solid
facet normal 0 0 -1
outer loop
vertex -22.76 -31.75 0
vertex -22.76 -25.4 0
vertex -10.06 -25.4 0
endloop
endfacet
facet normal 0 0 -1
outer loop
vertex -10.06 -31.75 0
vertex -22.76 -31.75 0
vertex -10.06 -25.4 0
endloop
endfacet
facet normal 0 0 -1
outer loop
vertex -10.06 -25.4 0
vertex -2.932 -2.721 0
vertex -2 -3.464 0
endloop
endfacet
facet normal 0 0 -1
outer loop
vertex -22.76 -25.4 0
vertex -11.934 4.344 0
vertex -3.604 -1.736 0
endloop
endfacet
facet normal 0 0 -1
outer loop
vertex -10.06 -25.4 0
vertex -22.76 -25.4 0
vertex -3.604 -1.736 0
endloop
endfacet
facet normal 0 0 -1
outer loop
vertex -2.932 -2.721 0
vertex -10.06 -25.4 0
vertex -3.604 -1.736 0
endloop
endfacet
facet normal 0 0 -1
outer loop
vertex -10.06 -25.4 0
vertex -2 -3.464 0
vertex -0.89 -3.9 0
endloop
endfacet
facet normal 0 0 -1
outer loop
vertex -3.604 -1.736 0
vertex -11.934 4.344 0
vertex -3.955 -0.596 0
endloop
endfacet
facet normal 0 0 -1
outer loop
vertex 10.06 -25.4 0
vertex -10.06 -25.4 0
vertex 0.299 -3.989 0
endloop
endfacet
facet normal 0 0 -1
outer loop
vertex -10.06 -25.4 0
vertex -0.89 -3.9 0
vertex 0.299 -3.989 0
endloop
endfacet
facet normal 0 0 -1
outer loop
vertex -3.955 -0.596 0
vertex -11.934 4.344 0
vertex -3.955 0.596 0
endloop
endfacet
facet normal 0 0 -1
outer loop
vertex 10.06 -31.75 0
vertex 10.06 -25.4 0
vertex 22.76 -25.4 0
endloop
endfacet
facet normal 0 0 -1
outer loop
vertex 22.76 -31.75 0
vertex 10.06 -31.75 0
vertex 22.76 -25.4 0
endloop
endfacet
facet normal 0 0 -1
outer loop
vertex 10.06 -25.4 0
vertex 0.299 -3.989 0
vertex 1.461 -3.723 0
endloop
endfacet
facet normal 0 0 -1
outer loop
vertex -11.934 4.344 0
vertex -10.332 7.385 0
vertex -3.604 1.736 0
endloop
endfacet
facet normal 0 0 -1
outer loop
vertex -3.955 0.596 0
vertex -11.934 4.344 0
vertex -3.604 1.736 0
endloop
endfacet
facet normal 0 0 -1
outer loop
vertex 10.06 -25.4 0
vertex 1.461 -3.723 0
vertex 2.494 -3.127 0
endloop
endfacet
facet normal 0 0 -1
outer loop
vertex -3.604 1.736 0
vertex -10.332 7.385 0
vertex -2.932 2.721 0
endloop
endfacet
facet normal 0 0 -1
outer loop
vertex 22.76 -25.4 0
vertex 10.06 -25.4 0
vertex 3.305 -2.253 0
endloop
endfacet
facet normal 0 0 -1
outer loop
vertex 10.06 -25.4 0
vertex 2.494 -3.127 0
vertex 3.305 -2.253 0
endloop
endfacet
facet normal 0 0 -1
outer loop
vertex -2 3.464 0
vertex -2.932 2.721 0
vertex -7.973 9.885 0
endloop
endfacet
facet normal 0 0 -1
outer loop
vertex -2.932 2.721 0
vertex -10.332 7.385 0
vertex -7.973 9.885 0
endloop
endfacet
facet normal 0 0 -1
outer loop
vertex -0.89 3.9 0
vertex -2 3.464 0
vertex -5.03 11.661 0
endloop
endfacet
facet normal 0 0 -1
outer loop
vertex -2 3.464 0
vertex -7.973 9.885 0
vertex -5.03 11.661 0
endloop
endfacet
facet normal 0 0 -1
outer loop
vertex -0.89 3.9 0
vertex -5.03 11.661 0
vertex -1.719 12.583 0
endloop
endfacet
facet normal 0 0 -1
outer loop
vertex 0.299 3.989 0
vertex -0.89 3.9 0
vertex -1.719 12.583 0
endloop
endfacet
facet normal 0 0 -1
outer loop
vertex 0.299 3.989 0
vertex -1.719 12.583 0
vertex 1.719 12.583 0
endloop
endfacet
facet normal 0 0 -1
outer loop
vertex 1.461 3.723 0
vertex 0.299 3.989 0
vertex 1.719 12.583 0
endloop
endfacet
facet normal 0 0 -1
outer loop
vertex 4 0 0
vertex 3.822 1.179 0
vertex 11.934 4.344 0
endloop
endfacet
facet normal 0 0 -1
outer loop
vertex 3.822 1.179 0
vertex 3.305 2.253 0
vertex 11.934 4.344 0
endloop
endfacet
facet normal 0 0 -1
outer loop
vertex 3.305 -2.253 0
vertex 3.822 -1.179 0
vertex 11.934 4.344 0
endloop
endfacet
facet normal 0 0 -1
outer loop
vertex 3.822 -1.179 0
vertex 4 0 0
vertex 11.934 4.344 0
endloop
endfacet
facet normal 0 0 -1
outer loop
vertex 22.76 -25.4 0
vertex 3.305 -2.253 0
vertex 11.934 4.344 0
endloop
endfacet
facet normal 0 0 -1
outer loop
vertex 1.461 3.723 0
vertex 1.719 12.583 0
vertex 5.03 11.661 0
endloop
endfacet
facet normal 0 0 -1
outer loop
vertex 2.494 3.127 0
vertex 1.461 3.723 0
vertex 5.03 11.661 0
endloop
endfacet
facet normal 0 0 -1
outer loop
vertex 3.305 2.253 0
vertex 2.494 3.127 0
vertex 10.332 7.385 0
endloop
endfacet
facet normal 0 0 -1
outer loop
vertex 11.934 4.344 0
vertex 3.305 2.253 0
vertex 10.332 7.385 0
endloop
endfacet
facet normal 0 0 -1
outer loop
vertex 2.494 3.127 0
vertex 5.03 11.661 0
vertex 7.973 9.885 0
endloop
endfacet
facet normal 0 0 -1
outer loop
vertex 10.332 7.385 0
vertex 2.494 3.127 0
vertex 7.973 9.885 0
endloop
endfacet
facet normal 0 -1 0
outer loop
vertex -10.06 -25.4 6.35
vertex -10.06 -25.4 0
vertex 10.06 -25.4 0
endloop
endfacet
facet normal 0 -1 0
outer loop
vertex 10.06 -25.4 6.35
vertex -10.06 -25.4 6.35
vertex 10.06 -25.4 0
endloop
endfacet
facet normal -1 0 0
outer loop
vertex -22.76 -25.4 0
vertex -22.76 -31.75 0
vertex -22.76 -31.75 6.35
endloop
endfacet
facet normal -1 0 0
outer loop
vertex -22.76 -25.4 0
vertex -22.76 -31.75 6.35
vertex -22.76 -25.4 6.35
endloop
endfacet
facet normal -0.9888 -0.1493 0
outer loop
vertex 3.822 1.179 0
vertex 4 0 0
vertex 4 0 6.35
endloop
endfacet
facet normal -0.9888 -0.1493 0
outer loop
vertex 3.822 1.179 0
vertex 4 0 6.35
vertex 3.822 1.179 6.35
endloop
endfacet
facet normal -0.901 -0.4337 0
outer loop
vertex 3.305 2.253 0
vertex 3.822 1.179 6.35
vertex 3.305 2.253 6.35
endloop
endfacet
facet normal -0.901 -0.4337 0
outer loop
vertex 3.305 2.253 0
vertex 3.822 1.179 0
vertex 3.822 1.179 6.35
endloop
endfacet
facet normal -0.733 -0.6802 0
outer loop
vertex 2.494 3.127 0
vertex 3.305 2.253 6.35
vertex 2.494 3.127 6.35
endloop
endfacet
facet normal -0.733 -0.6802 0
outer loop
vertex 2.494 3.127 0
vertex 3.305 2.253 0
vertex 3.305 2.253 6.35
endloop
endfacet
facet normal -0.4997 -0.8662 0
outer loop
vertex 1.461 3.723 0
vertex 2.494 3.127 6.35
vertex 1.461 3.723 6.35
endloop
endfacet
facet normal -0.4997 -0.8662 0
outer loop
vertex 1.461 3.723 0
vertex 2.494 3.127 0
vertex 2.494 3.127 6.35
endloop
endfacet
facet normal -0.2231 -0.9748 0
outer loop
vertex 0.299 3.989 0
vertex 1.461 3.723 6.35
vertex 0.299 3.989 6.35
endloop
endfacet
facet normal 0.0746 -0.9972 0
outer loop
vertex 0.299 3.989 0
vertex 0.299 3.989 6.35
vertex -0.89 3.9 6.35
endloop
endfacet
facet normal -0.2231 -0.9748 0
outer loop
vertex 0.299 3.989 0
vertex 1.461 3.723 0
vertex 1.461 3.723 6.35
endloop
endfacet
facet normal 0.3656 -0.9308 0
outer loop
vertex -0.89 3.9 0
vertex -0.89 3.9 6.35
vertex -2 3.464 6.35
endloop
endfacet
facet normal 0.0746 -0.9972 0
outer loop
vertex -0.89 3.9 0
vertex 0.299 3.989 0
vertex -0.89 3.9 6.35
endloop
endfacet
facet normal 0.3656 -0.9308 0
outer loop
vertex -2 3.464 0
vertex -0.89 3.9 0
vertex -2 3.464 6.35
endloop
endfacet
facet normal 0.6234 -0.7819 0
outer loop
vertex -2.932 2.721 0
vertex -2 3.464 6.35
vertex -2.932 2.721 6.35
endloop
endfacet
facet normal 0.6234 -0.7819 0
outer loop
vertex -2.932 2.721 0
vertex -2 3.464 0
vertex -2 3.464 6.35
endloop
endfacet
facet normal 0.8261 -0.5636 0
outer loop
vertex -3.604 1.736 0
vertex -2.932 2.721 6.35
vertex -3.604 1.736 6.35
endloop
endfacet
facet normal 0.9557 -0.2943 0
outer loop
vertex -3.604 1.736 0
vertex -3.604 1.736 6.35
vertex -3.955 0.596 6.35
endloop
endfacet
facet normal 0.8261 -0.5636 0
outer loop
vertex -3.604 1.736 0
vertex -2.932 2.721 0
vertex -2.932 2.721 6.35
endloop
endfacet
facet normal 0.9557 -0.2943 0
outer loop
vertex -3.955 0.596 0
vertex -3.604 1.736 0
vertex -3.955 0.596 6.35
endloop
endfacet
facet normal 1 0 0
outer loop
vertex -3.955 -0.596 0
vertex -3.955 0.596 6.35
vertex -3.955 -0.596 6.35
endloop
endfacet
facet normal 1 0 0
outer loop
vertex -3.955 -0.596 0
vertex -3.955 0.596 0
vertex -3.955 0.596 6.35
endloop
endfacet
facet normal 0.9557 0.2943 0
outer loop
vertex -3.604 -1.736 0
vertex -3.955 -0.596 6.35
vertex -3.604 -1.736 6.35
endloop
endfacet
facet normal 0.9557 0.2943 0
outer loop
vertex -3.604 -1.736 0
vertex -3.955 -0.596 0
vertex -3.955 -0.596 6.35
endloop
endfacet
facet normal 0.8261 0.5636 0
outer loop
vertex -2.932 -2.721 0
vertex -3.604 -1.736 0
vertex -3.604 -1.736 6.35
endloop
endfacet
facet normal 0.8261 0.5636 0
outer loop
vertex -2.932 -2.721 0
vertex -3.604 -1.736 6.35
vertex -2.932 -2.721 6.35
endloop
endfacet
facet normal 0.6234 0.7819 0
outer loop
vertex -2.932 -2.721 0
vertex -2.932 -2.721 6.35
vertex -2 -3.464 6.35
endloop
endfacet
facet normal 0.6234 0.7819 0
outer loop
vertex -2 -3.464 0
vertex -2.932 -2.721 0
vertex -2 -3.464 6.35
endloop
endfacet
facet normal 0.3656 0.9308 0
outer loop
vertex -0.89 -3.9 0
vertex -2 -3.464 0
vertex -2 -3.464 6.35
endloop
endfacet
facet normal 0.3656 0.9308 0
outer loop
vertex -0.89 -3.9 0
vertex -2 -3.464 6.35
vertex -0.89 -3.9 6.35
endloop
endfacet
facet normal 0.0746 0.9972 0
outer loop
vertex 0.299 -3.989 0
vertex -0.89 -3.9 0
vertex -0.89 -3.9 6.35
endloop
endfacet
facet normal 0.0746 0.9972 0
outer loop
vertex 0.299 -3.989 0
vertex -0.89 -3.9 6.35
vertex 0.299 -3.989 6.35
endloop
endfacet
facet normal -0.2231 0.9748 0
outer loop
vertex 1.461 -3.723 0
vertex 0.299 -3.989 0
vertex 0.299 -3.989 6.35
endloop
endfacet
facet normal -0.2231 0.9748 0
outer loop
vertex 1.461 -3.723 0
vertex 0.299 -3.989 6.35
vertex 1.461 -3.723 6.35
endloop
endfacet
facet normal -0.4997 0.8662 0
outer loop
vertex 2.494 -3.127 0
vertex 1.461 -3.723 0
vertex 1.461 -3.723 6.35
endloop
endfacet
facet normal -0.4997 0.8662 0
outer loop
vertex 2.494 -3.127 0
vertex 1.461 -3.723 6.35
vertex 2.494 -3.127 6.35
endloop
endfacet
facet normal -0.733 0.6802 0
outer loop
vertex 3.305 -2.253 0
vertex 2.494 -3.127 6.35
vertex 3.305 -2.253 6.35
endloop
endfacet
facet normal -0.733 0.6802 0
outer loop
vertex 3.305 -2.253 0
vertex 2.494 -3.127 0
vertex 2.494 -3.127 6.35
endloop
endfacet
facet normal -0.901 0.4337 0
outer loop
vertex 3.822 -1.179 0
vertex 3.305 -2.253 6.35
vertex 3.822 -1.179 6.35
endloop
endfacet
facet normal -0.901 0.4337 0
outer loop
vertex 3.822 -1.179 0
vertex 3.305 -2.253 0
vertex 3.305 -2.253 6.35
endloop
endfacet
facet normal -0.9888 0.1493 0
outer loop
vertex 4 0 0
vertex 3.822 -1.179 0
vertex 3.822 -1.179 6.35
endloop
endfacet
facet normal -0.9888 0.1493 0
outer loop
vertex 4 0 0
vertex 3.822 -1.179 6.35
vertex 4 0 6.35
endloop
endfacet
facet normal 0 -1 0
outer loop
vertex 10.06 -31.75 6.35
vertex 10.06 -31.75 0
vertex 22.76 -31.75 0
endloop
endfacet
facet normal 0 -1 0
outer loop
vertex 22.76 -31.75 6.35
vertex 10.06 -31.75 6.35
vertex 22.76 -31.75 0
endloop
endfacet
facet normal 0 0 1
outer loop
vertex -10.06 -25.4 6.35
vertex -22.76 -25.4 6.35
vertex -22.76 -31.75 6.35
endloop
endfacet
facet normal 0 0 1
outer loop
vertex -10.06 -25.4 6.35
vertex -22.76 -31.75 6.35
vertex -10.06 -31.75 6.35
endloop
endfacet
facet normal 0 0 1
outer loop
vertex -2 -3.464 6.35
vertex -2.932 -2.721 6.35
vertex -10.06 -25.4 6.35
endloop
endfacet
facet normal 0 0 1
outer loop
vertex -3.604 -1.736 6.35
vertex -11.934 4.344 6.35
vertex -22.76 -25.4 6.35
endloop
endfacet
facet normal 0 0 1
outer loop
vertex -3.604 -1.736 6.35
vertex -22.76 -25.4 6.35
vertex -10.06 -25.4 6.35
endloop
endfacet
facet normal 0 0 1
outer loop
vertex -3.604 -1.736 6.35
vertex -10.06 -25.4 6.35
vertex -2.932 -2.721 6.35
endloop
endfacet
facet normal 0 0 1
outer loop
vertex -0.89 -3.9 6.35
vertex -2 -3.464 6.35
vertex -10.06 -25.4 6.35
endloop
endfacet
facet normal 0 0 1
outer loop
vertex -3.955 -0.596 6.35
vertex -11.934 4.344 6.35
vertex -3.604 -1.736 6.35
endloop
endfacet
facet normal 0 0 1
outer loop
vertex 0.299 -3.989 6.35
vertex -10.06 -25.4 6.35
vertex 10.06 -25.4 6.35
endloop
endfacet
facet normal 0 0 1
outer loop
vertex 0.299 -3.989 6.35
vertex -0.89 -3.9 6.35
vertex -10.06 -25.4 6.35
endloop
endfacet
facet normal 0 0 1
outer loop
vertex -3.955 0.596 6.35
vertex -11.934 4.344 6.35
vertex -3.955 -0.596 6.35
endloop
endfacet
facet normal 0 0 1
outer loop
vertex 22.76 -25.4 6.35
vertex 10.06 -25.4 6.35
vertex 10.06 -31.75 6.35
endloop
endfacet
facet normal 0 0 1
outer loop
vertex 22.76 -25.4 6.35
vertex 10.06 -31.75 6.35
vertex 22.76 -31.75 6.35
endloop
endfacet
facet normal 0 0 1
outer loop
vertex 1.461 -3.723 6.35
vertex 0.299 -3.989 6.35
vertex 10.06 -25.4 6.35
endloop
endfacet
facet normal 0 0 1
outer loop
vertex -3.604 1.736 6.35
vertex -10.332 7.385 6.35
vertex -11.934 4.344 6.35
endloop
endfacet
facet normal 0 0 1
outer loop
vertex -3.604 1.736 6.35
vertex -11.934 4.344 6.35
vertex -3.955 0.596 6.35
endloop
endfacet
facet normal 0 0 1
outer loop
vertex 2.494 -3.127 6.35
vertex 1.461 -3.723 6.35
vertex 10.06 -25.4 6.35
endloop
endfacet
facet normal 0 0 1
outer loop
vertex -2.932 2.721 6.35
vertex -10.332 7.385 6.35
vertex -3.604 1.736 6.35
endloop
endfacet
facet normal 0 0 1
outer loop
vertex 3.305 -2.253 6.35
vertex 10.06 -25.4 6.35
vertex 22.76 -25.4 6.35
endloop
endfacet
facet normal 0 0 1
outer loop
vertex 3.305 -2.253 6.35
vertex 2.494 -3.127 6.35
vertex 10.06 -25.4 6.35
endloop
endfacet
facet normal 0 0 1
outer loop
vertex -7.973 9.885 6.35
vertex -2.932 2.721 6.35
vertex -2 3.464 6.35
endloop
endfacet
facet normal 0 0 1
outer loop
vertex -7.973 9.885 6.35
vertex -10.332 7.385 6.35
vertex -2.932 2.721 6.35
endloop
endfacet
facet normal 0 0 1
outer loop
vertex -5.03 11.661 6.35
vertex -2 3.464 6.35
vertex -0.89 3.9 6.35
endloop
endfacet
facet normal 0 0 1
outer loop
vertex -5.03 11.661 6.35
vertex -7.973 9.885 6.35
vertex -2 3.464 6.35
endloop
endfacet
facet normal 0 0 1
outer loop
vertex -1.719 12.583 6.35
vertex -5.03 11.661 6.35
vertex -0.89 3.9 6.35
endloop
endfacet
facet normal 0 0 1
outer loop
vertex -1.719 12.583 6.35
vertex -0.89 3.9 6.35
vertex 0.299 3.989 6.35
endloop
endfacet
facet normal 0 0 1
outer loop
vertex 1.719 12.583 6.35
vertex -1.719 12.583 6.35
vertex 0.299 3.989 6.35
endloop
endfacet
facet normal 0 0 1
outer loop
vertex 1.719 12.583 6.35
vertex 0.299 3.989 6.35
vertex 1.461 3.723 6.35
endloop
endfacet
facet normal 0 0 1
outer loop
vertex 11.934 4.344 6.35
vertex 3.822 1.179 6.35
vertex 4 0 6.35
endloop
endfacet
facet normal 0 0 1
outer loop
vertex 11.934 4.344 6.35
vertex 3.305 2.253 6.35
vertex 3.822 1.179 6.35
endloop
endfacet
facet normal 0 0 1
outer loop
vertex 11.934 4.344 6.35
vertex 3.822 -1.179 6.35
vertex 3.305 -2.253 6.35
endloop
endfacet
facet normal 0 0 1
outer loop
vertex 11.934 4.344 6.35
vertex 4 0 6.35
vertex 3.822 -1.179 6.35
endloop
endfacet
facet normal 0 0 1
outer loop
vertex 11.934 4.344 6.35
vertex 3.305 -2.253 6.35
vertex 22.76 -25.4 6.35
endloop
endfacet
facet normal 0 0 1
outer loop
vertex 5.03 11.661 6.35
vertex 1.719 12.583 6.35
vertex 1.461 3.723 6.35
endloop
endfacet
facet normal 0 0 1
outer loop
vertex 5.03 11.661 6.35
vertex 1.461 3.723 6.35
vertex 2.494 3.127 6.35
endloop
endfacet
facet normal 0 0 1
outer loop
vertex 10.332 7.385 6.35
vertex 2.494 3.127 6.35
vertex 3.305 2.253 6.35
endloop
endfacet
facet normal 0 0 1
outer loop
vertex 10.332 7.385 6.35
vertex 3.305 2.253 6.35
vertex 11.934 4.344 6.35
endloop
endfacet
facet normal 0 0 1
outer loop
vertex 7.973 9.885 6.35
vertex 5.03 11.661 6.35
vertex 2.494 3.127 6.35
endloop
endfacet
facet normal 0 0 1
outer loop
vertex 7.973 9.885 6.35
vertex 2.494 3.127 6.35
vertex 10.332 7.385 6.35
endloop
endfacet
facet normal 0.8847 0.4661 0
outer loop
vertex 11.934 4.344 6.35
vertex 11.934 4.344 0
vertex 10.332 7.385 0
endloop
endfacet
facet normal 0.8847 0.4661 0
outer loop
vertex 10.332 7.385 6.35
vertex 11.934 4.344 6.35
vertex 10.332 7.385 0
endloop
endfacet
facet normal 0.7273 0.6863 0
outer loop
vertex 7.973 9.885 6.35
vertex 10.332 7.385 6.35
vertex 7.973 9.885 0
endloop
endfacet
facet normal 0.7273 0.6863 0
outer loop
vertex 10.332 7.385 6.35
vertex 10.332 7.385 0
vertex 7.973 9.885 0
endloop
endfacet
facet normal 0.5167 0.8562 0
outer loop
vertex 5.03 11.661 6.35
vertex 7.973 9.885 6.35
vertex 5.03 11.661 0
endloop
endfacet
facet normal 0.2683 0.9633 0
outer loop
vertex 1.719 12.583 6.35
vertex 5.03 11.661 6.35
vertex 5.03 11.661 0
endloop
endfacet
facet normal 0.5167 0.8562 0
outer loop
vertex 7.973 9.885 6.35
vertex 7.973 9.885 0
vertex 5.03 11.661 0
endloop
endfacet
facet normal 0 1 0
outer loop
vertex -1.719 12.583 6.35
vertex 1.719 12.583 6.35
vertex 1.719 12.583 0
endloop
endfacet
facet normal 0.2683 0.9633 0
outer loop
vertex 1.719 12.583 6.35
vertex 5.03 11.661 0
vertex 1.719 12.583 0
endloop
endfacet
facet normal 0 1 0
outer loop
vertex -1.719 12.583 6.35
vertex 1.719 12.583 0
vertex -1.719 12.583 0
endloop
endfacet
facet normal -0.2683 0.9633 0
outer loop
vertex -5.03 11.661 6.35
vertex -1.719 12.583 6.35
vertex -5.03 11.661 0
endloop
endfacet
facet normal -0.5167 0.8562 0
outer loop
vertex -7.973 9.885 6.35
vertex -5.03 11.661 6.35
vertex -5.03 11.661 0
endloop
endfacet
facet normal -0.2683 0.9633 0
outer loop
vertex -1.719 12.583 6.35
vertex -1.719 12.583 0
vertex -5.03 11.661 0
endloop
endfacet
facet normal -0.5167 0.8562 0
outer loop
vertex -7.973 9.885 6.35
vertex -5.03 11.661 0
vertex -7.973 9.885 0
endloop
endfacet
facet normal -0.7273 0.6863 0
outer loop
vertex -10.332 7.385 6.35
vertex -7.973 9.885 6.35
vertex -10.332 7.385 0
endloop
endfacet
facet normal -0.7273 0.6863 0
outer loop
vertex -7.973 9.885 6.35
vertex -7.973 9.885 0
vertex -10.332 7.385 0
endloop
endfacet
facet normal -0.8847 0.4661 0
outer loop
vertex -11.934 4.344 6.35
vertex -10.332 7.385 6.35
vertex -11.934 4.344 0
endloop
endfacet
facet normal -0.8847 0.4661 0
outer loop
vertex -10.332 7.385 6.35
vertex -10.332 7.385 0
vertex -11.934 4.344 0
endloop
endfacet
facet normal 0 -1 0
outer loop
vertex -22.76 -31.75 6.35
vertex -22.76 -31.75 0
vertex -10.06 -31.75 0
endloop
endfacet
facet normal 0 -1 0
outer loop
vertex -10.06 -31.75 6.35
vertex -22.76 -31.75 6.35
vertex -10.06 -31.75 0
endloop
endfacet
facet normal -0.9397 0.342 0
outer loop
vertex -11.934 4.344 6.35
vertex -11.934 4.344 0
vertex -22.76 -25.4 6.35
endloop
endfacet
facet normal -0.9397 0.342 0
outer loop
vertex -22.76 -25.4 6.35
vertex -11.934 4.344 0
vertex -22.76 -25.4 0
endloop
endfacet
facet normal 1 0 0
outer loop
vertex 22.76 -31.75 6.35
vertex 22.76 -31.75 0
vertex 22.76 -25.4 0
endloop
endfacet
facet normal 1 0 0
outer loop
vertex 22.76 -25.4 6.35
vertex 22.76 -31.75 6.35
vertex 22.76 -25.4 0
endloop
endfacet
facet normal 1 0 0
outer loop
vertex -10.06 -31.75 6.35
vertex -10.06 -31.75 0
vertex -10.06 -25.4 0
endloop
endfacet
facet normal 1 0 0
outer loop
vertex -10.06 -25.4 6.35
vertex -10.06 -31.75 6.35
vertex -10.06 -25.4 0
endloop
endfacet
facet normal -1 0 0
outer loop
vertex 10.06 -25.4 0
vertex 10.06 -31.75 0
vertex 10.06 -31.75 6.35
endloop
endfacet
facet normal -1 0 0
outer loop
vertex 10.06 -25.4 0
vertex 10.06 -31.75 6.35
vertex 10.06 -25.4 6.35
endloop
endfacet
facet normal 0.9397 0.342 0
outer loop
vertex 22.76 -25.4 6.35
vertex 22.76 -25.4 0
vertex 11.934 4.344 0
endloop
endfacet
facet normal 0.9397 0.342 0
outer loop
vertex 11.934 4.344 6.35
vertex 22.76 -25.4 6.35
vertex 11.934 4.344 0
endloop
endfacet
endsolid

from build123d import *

# Parameters (mm, degrees)
SKETCH2_W           = 12.7
SKETCH2_H           = 6.35
SKETCH2_R           = 4
BOSS_EXTRUDE1_DEPTH = 6.35


with BuildPart() as part:
    # Sketch2 → Boss-Extrude1 (new body)
    # profile 1 of 3: a face of its own
    with BuildSketch(Plane.XY):
        with Locations((-16.409901661, -28.575)):
            Rectangle(SKETCH2_W, SKETCH2_H)
    # profile 2 of 3: a face of its own
    with BuildSketch(Plane.XY):
        with BuildLine():
            Line((22.759901661, -25.4), (11.934096284, 4.34365582))
            ThreePointArc((11.934096284, 4.34365582), (0, 12.7), (-11.934096284, 4.34365582))
            Line((-11.934096284, 4.34365582), (-22.759901661, -25.4))
            Line((-22.759901661, -25.4), (22.759901661, -25.4))
        make_face()
        Circle(SKETCH2_R, mode=Mode.SUBTRACT)
    # profile 3 of 3: a face of its own
    with BuildSketch(Plane.XY):
        with Locations((16.409901661, -28.575)):
            Rectangle(SKETCH2_W, SKETCH2_H)
    extrude(amount=BOSS_EXTRUDE1_DEPTH)


solid = part.part
